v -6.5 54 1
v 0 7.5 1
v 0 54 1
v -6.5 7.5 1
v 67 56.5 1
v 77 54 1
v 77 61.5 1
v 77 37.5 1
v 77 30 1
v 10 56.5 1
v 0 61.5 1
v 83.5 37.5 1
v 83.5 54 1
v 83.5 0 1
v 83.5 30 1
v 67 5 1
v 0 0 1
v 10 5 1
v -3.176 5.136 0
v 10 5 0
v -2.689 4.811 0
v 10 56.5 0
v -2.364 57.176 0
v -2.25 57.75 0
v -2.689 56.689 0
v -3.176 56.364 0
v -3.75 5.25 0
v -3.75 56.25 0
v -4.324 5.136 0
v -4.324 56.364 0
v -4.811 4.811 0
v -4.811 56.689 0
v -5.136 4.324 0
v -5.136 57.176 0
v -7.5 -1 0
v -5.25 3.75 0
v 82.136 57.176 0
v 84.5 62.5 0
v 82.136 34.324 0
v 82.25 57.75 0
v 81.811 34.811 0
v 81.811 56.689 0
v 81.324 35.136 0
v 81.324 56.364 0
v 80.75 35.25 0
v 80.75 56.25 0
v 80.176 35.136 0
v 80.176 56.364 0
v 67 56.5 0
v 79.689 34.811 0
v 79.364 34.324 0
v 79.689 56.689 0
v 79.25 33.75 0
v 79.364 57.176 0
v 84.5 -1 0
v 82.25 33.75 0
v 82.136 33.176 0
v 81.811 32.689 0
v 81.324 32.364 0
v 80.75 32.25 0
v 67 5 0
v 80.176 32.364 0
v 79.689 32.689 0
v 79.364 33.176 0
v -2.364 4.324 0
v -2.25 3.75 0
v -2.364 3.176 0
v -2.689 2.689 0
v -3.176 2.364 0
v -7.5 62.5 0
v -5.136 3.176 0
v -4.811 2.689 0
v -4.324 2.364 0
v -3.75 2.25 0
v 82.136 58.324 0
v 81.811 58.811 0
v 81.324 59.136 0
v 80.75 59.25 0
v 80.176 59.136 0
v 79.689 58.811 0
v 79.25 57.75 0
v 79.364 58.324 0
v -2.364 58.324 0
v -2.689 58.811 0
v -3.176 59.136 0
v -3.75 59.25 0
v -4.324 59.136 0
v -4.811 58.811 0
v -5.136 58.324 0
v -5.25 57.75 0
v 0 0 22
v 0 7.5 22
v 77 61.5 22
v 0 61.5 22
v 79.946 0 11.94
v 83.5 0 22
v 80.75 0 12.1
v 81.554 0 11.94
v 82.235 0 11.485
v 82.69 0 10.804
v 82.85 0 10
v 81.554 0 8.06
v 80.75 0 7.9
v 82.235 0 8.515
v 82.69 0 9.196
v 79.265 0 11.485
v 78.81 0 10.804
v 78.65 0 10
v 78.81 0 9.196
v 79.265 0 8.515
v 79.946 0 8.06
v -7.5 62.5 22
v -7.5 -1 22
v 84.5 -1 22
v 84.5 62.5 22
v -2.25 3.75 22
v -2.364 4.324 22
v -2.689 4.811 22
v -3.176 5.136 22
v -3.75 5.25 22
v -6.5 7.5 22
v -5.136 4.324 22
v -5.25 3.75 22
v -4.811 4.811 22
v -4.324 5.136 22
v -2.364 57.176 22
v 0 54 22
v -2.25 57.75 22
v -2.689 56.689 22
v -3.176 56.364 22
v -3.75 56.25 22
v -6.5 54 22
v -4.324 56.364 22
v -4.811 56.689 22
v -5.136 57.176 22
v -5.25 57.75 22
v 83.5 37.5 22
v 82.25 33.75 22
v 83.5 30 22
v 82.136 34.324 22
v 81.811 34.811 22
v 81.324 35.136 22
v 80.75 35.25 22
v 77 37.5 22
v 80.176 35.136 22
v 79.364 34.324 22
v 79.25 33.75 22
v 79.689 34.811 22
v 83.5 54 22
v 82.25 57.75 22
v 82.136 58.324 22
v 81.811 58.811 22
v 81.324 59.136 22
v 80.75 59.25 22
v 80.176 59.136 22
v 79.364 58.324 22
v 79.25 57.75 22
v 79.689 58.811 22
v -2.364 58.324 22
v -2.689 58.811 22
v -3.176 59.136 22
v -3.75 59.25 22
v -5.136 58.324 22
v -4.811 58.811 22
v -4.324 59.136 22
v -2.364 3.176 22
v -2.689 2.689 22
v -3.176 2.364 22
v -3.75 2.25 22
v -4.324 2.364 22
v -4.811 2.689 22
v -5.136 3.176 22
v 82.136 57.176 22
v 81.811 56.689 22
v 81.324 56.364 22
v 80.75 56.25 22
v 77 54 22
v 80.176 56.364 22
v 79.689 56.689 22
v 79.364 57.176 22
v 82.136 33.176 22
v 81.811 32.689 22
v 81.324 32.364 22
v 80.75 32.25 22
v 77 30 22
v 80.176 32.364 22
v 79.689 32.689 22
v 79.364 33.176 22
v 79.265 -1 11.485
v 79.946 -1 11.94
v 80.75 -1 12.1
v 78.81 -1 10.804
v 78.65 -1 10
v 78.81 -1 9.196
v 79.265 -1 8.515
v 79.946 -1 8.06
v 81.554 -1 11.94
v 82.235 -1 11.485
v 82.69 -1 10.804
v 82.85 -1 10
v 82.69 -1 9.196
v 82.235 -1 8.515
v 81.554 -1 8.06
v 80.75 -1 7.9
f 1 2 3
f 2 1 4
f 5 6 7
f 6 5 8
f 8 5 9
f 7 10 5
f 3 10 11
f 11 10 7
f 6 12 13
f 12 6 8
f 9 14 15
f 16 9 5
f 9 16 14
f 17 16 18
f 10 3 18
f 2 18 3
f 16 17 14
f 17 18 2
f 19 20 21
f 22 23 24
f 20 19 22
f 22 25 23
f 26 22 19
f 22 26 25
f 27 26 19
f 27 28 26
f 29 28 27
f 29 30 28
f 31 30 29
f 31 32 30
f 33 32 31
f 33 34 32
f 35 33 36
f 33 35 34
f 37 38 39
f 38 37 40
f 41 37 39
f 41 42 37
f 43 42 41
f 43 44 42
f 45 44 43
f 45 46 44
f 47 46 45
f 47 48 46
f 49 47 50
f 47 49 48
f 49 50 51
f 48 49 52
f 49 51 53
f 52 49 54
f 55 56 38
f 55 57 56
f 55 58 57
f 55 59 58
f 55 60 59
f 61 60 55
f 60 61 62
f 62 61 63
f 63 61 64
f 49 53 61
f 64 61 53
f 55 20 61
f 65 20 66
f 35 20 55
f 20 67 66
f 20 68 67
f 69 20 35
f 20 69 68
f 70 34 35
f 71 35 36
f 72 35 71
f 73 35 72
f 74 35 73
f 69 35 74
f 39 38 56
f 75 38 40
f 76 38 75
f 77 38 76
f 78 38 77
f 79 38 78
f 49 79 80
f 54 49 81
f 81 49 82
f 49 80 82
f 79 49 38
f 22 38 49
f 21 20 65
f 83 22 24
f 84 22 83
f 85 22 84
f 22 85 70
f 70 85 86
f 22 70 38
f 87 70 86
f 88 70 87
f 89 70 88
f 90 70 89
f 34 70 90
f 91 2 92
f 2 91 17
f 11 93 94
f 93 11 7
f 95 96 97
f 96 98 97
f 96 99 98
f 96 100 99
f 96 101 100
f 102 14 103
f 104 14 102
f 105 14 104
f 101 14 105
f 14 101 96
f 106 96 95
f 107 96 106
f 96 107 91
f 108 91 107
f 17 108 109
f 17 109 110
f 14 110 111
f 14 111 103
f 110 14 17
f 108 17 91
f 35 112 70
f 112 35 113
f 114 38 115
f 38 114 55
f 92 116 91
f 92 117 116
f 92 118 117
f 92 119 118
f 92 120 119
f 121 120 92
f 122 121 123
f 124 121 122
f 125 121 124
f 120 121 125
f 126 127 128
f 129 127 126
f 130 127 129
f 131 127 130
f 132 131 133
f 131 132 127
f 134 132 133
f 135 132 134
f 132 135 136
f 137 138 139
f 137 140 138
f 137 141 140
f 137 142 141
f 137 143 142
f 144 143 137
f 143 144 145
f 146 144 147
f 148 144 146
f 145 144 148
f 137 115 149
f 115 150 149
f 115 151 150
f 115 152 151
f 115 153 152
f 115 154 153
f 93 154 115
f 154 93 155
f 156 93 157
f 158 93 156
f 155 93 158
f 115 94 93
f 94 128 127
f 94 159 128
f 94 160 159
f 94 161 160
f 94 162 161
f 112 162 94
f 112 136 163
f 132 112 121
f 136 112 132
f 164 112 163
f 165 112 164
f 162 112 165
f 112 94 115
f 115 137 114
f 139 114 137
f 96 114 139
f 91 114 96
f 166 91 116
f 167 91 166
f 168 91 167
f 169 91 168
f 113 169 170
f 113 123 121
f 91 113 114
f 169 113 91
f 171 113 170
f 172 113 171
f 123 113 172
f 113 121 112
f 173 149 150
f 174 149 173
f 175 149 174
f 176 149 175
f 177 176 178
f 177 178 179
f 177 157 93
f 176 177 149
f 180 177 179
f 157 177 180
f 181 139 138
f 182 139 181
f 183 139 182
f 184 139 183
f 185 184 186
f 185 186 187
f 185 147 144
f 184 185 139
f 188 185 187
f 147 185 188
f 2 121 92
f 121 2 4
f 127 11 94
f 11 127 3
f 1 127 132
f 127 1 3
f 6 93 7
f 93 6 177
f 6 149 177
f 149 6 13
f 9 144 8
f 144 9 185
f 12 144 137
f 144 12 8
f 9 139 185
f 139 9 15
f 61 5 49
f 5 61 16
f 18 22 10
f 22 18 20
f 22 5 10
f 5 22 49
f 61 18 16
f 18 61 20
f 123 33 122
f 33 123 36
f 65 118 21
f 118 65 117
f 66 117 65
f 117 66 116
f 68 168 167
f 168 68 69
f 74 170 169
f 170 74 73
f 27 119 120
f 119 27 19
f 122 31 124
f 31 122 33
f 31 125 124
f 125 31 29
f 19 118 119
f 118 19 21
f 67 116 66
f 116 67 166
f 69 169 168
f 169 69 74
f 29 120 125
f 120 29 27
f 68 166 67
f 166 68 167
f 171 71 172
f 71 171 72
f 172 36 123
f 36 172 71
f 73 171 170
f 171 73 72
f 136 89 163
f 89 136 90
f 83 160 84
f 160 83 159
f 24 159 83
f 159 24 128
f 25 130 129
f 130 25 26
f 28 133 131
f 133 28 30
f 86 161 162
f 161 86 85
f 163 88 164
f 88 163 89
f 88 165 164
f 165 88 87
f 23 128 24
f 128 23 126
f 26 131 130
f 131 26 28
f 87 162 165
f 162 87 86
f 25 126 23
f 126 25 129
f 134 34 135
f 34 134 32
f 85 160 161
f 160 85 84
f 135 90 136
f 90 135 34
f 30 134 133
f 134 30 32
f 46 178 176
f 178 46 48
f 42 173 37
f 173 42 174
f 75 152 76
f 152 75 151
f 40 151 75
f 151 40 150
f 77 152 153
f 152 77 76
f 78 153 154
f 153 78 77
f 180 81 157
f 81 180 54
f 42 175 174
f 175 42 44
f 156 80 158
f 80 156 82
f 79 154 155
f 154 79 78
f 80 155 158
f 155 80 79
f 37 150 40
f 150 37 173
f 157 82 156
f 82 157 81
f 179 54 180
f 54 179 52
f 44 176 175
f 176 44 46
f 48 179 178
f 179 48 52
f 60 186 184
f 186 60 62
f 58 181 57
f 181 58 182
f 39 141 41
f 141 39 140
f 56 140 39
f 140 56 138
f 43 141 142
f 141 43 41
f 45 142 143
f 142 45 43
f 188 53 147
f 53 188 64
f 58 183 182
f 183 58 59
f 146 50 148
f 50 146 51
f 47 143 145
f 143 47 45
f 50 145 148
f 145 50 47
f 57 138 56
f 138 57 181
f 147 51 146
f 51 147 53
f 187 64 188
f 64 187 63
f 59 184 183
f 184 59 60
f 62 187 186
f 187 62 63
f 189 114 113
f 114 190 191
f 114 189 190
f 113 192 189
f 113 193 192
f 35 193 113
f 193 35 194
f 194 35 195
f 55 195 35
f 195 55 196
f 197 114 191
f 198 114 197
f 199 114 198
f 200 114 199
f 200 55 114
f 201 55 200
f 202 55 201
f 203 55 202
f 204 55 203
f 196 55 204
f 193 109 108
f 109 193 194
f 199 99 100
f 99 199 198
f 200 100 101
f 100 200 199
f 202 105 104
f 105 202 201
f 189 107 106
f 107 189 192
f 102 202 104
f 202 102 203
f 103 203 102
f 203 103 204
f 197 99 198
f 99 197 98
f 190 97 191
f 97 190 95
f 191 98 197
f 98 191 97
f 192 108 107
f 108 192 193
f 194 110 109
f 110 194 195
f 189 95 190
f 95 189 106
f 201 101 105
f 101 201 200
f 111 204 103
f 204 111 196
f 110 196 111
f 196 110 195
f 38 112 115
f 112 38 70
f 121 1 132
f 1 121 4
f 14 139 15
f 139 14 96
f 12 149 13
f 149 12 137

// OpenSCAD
use <../nscad-lib.scad>

color("orange") akkubox_18650_1x4(height = 22, cells = 3);
